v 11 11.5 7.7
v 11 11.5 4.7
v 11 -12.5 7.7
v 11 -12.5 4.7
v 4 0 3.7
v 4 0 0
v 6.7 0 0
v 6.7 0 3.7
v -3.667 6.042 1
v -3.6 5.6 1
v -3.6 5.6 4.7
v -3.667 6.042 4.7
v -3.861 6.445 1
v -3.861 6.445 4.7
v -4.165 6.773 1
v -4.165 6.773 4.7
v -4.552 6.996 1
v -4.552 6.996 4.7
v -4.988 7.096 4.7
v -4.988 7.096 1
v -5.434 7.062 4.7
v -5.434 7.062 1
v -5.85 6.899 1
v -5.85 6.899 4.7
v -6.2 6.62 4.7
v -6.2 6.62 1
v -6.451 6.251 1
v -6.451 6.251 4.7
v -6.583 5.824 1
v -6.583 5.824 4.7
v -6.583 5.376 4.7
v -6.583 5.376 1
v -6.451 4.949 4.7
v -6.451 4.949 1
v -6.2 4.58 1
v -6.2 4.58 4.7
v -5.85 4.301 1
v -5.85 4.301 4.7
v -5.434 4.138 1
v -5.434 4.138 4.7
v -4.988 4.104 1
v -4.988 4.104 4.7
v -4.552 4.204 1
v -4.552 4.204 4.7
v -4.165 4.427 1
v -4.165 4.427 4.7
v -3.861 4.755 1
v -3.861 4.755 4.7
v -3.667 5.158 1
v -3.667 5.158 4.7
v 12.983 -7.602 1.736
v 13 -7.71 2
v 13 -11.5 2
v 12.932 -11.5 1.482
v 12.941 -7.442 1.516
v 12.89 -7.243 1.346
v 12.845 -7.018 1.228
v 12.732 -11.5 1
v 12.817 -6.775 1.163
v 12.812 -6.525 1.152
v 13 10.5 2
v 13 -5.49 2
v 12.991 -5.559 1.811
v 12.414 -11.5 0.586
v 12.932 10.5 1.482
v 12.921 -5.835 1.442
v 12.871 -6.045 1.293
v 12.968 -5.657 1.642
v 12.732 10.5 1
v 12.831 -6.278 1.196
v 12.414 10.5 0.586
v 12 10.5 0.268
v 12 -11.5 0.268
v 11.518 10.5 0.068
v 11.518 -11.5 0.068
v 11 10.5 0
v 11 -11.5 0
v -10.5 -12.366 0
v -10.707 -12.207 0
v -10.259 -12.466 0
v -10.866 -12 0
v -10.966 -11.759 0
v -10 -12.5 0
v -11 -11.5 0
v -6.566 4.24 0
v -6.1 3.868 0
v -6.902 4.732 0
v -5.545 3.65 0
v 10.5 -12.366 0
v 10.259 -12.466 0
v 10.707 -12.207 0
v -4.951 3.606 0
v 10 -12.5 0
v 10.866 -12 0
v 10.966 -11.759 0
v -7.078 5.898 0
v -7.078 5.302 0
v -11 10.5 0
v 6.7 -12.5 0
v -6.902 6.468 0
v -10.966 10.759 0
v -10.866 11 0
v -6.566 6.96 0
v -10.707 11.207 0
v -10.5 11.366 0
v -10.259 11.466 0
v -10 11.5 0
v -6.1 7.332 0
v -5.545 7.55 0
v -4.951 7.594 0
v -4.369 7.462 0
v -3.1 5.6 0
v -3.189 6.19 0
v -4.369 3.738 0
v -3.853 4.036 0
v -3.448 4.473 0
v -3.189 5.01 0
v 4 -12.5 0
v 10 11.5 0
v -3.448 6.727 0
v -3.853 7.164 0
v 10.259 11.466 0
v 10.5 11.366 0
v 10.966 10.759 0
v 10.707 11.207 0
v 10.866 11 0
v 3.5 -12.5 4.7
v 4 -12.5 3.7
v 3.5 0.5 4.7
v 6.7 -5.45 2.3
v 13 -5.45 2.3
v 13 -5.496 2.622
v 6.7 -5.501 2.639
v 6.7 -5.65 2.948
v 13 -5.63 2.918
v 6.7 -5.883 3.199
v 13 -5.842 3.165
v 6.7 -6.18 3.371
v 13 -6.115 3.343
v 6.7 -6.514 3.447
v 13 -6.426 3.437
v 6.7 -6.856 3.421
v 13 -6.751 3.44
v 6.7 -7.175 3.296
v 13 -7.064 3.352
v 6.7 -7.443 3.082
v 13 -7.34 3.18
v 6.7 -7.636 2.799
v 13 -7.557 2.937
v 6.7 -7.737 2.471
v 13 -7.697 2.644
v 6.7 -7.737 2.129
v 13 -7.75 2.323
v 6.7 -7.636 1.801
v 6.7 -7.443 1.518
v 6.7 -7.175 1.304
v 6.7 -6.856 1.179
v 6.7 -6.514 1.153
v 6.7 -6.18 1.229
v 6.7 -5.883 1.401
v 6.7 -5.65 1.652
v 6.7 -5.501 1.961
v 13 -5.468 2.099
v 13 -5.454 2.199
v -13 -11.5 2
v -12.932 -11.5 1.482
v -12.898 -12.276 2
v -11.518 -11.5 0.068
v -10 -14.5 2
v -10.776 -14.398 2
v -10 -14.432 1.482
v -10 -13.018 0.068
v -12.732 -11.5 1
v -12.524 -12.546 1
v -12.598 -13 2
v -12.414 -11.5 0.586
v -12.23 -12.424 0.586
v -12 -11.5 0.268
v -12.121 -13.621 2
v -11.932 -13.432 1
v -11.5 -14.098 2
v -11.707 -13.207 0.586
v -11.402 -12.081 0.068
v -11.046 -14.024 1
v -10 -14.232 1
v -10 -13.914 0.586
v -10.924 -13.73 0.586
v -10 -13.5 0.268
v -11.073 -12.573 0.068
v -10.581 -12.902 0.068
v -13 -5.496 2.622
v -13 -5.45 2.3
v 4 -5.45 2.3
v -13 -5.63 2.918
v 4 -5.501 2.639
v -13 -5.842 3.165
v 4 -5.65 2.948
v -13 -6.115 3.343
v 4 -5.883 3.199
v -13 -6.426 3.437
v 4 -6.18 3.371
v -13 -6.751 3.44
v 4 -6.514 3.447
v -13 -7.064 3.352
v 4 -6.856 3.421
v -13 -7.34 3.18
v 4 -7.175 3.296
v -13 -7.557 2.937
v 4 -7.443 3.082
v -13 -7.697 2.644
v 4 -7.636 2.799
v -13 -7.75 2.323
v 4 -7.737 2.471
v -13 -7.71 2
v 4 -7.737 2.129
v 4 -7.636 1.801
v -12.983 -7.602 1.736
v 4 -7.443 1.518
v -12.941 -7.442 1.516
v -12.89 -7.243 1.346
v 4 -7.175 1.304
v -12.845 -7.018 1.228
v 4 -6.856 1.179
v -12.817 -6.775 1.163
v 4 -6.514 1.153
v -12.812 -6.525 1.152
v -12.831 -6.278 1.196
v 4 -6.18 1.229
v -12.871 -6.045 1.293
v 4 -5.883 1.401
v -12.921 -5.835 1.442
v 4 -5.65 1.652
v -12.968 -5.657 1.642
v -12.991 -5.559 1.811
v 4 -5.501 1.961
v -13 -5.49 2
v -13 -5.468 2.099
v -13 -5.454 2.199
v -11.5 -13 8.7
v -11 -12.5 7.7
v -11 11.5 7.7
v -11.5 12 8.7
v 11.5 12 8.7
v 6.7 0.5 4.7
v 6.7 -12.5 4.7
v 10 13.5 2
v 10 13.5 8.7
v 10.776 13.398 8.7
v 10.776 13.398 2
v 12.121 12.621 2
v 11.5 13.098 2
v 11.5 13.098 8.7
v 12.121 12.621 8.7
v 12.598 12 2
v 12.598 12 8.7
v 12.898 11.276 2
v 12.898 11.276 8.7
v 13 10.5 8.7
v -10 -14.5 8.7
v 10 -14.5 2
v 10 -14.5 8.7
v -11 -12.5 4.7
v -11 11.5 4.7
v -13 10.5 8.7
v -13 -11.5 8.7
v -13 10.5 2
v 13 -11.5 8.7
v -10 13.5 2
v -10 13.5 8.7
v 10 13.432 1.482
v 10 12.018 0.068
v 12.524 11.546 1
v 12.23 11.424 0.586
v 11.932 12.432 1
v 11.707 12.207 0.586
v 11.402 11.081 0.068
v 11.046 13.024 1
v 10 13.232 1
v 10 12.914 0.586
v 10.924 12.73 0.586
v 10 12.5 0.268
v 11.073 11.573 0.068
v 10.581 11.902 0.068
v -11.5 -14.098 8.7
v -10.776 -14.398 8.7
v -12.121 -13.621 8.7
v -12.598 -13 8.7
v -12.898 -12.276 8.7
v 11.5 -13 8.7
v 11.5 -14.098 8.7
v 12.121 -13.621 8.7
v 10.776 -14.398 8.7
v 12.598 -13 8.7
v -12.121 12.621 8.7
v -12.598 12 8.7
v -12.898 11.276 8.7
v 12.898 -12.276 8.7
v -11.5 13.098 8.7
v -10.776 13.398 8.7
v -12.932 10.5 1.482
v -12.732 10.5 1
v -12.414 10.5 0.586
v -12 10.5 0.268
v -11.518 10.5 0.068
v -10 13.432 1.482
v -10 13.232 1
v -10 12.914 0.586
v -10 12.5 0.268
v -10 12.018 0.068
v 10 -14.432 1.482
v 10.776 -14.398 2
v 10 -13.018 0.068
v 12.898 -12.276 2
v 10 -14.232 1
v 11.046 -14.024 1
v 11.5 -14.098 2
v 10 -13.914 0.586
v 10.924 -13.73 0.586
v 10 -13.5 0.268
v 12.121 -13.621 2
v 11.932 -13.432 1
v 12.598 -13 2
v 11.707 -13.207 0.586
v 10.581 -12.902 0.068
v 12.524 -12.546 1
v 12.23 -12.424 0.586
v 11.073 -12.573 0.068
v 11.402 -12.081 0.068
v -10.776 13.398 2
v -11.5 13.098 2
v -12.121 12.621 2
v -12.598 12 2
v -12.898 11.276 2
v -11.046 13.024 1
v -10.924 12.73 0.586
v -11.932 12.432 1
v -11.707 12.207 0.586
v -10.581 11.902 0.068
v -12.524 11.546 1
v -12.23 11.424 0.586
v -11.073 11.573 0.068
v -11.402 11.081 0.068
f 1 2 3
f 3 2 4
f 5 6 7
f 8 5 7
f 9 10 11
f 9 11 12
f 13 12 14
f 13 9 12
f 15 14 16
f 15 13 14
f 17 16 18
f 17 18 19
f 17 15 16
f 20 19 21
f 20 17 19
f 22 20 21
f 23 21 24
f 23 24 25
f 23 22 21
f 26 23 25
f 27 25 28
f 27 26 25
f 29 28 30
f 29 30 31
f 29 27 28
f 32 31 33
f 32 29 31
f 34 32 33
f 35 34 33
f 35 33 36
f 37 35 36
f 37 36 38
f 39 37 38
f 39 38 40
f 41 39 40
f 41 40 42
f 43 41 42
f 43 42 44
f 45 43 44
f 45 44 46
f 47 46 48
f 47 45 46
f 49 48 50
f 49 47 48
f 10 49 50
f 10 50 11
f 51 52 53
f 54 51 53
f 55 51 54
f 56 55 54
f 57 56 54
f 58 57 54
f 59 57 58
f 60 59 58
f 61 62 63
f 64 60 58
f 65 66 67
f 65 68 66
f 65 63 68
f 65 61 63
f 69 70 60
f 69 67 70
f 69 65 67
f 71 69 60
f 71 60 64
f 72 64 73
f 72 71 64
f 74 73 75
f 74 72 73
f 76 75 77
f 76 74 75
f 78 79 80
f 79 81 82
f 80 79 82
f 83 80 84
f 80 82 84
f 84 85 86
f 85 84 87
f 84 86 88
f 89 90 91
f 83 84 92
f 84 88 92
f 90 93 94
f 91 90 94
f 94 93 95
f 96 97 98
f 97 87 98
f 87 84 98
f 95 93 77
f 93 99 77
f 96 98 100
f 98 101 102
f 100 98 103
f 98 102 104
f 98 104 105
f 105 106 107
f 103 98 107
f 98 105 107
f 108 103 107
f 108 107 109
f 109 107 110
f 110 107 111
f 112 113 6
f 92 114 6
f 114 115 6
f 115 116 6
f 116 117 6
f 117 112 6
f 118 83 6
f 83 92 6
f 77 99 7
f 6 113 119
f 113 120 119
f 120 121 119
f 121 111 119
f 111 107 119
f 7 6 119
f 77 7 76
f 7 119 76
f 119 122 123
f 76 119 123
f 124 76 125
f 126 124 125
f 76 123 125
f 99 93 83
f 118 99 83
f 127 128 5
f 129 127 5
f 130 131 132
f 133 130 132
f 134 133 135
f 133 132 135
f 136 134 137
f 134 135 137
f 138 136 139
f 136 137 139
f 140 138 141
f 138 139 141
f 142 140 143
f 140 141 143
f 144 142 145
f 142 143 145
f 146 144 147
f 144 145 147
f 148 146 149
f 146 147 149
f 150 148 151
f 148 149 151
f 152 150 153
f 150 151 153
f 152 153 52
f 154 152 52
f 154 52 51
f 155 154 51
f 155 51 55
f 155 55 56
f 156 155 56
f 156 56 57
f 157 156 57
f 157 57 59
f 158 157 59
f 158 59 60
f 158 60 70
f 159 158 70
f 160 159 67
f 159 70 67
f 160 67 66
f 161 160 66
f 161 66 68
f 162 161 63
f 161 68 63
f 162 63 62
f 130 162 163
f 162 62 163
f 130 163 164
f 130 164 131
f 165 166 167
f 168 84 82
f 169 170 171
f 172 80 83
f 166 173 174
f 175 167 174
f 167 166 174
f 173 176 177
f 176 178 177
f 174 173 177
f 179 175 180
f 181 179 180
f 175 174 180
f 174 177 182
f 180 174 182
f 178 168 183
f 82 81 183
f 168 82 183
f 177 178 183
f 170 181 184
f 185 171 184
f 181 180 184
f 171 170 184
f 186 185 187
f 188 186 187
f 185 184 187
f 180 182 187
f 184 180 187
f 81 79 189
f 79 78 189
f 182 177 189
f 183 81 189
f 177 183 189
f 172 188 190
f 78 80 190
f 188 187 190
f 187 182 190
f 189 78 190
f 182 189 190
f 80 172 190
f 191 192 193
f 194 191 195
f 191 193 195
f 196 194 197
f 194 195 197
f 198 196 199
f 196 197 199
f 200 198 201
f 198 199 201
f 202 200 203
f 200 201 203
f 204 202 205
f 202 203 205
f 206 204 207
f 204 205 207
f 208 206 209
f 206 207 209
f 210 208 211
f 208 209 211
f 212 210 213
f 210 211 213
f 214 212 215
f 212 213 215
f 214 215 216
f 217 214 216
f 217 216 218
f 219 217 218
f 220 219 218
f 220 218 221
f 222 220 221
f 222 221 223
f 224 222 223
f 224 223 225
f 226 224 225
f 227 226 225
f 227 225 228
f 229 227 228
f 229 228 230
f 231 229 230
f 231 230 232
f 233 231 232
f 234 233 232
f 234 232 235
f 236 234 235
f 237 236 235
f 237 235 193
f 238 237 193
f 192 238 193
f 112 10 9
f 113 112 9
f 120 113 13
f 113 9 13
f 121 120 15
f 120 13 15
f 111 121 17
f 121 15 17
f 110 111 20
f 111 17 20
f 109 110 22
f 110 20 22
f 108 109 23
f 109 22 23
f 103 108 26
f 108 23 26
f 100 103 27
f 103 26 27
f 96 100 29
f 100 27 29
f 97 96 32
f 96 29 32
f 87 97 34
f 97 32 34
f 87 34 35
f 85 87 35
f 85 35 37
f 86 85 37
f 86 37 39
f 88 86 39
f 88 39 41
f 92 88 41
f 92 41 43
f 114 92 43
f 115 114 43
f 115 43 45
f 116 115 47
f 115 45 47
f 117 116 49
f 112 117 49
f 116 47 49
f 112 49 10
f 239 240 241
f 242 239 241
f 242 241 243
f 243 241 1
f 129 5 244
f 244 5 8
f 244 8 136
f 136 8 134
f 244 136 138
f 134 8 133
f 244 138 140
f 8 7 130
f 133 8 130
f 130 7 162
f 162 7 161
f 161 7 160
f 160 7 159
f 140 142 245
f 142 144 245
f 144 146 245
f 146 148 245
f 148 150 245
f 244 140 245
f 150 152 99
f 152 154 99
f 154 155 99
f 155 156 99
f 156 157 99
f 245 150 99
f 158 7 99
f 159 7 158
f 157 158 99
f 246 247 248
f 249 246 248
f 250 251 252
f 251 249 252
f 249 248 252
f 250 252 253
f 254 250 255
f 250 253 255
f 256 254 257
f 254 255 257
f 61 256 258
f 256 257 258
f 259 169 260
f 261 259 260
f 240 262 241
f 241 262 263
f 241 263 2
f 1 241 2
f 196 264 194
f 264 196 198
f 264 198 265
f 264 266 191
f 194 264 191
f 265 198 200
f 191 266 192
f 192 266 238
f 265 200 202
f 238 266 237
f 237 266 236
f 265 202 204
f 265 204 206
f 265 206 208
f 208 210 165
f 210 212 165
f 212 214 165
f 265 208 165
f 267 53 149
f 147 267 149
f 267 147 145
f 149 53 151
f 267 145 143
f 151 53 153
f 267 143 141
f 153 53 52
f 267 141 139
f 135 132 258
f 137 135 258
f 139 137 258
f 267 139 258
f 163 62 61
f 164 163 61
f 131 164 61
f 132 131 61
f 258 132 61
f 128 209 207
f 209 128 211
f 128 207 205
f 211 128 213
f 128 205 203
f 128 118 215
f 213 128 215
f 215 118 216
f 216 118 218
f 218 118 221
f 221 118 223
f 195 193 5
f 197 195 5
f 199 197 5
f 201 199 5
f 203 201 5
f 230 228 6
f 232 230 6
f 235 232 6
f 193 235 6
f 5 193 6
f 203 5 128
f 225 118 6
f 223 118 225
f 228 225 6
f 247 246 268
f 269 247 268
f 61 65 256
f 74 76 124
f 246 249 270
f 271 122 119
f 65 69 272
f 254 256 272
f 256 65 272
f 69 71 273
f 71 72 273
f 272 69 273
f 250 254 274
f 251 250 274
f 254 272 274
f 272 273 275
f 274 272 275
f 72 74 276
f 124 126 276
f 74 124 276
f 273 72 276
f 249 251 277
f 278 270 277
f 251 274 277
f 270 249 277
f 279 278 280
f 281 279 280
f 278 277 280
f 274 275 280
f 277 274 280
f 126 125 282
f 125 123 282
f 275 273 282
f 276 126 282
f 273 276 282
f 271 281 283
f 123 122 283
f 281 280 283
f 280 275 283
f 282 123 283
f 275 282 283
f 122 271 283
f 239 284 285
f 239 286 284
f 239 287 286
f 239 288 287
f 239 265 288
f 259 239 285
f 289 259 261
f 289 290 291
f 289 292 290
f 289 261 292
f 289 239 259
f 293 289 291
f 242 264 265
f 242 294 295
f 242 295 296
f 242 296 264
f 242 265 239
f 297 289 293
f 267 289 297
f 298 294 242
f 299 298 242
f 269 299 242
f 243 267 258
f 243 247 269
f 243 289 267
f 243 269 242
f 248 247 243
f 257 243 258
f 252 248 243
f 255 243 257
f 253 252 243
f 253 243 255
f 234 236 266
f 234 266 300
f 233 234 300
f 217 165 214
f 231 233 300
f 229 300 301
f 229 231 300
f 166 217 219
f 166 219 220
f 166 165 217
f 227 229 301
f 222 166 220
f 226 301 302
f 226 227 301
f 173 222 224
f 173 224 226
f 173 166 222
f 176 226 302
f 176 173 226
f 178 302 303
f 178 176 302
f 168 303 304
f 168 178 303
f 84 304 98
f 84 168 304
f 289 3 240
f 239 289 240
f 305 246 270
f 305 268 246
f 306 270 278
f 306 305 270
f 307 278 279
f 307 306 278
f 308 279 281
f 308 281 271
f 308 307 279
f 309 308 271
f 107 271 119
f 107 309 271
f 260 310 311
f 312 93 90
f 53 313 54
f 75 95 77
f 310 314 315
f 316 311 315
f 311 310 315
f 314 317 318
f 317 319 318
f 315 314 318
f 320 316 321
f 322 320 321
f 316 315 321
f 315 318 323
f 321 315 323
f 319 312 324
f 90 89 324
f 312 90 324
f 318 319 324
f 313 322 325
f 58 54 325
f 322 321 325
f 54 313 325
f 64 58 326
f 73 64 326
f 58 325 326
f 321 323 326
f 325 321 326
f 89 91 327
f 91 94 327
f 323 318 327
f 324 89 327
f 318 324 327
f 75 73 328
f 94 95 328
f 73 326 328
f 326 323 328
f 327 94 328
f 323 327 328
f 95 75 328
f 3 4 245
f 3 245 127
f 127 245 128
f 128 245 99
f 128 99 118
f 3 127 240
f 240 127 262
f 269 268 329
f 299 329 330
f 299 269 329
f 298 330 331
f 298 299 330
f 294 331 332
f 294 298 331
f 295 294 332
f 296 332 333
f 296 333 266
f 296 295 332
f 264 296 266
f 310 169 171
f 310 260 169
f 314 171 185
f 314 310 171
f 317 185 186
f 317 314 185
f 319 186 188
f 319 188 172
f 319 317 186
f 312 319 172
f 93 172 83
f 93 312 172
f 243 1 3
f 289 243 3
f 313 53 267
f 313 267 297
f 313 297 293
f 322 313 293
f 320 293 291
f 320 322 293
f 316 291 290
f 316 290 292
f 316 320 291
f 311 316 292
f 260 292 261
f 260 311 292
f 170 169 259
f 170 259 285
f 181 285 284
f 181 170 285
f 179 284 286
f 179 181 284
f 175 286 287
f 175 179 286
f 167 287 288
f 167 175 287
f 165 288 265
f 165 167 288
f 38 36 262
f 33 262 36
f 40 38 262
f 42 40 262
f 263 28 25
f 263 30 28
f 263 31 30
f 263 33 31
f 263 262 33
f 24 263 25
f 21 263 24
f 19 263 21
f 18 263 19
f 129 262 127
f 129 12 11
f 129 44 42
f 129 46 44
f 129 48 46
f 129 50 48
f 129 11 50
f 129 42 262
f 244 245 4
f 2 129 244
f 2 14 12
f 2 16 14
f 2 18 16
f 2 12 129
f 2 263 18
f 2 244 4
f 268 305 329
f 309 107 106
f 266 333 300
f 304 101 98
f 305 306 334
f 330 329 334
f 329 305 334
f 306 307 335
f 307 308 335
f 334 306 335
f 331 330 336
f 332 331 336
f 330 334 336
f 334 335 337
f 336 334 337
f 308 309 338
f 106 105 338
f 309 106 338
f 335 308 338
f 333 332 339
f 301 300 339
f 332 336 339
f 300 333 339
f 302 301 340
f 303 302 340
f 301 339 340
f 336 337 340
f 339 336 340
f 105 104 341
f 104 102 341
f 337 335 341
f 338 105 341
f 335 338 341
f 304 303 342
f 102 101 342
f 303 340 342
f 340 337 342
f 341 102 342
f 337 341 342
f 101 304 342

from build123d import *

# Parameters (mm, degrees)
F0_W       = 22
F0_H       = 2
F0_R       = 1.5
F1_DEPTH   = 4.7
F2_DEPTH   = 8.7
F3_R       = 1.5
F4_DEPTH   = 4.701
F6_SIZE2   = 1
F6_SIZE    = 0.5
F6_2_SIZE2 = 1
F6_2_SIZE  = 0.5
F6_3_SIZE2 = 1
F6_3_SIZE  = 0.5
F7_R       = 3
F8_R       = 1.99999
F5_R       = 1.15
F9_DEPTH   = 26.0010001


# Not quite as in the source:
# - a fillet or chamfer is up to 0.001 mm smaller than in the source, because OpenCascade refuses the exact size


with BuildPart() as f1:
    # F0 (on Top) → F1 (new body)
    with BuildSketch(Plane.XY):
        with Locations((0, 12.5)):
            Rectangle(F0_W, F0_H)
        Polygon((-11, -12.5), (-11, 11.5), (-11, 13.5), (-13, 13.5), (-13, -14.5), (-11, -14.5), align=None)
        Polygon((11, 13.5), (11, 11.5), (11, -12.5), (11, -14.5), (13, -14.5), (13, 13.5), align=None)
        Polygon((4, -12.5), (-11, -12.5), (-11, -14.5), (11, -14.5), (11, -12.5), (6.7, -12.5), align=None)
        Polygon((11, 11.5), (-11, 11.5), (-11, -12.5), (4, -12.5), (4, 0), (6.7, 0), (6.7, -12.5), (11, -12.5), align=None)
        with Locations((-5.1, 5.6)):
            Circle(F0_R, mode=Mode.SUBTRACT)
    extrude(amount=F1_DEPTH)

    # F0 (on Top) → F2 (join)
    with BuildSketch(Plane.XY):
        Polygon((11, 13.5), (11, 11.5), (11, -12.5), (11, -14.5), (13, -14.5), (13, 13.5), align=None)
        Polygon((4, -12.5), (-11, -12.5), (-11, -14.5), (11, -14.5), (11, -12.5), (6.7, -12.5), align=None)
        Polygon((-11, -12.5), (-11, 11.5), (-11, 13.5), (-13, 13.5), (-13, -14.5), (-11, -14.5), align=None)
        with Locations((0, 12.5)):
            Rectangle(F0_W, F0_H)
    extrude(amount=F2_DEPTH)

    # F3 (on face) → F4 (cut, through all)
    with BuildSketch(Plane.XY.offset(4.7)):
        with Locations((-5.1, 5.6)):
            Circle(F3_R)
    extrude(amount=-F4_DEPTH, mode=Mode.SUBTRACT)

    # F6
    f6_edges = [f1.edges().sort_by_distance(p)[0] for p in [
        (0, 11.5, 8.7),
        (11, -0.5, 8.7),
        (-11, -0.5, 8.7),
        (0, -12.5, 8.7),
    ]]
    f6_side = f1.faces().sort_by_distance((11.382099, -0.5, 8.7))[0]
    chamfer(f6_edges, length=F6_SIZE, length2=F6_SIZE2, reference=f6_side)

    # F6#2
    f6_2_edges = [f1.edges().sort_by_distance(p)[0] for p in [
        (-6.6, 5.6, 0),
    ]]
    f6_2_side = f1.faces().sort_by_distance((-0.210298, -0.280343, 0))[0]
    chamfer(f6_2_edges, length=F6_2_SIZE, length2=F6_2_SIZE2, reference=f6_2_side)

    # F6#3
    f6_3_edges = [f1.edges().sort_by_distance(p)[0] for p in [
        (5.35, 0, 4.7),
        (4, -6.25, 4.7),
    ]]
    f6_3_side = f1.faces().sort_by_distance((-0.29663, -0.190169, 4.7))[0]
    chamfer(f6_3_edges, length=F6_3_SIZE, length2=F6_3_SIZE2, reference=f6_3_side)

    # F7
    f7_edges = [f1.edges().sort_by_distance(p)[0] for p in [
        (-13, -14.5, 4.35),
        (13, -14.5, 4.35),
        (-13, 13.5, 4.35),
        (13, 13.5, 4.35),
    ]]
    fillet(f7_edges, radius=F7_R)

    # F8 (radius 2 in the source; OpenCascade refuses exactly that, so slightly less here)
    f8_edges = [f1.edges().sort_by_distance(p)[0] for p in [
        (13, -0.5, 0),
        (12.12132, -13.62132, 0),
        (0, -14.5, 0),
        (-12.12132, -13.62132, 0),
        (12.12132, 12.62132, 0),
        (0, 13.5, 0),
        (-12.12132, 12.62132, 0),
        (-13, -0.5, 0),
    ]]
    fillet(f8_edges, radius=F8_R)

    # F5 (on face) → F9 (cut, through all)
    with BuildSketch(Plane.YZ.offset(13)):
        with Locations((-6.6, 2.3)):
            Circle(F5_R)
    extrude(amount=-F9_DEPTH, mode=Mode.SUBTRACT)


solid = f1.part
